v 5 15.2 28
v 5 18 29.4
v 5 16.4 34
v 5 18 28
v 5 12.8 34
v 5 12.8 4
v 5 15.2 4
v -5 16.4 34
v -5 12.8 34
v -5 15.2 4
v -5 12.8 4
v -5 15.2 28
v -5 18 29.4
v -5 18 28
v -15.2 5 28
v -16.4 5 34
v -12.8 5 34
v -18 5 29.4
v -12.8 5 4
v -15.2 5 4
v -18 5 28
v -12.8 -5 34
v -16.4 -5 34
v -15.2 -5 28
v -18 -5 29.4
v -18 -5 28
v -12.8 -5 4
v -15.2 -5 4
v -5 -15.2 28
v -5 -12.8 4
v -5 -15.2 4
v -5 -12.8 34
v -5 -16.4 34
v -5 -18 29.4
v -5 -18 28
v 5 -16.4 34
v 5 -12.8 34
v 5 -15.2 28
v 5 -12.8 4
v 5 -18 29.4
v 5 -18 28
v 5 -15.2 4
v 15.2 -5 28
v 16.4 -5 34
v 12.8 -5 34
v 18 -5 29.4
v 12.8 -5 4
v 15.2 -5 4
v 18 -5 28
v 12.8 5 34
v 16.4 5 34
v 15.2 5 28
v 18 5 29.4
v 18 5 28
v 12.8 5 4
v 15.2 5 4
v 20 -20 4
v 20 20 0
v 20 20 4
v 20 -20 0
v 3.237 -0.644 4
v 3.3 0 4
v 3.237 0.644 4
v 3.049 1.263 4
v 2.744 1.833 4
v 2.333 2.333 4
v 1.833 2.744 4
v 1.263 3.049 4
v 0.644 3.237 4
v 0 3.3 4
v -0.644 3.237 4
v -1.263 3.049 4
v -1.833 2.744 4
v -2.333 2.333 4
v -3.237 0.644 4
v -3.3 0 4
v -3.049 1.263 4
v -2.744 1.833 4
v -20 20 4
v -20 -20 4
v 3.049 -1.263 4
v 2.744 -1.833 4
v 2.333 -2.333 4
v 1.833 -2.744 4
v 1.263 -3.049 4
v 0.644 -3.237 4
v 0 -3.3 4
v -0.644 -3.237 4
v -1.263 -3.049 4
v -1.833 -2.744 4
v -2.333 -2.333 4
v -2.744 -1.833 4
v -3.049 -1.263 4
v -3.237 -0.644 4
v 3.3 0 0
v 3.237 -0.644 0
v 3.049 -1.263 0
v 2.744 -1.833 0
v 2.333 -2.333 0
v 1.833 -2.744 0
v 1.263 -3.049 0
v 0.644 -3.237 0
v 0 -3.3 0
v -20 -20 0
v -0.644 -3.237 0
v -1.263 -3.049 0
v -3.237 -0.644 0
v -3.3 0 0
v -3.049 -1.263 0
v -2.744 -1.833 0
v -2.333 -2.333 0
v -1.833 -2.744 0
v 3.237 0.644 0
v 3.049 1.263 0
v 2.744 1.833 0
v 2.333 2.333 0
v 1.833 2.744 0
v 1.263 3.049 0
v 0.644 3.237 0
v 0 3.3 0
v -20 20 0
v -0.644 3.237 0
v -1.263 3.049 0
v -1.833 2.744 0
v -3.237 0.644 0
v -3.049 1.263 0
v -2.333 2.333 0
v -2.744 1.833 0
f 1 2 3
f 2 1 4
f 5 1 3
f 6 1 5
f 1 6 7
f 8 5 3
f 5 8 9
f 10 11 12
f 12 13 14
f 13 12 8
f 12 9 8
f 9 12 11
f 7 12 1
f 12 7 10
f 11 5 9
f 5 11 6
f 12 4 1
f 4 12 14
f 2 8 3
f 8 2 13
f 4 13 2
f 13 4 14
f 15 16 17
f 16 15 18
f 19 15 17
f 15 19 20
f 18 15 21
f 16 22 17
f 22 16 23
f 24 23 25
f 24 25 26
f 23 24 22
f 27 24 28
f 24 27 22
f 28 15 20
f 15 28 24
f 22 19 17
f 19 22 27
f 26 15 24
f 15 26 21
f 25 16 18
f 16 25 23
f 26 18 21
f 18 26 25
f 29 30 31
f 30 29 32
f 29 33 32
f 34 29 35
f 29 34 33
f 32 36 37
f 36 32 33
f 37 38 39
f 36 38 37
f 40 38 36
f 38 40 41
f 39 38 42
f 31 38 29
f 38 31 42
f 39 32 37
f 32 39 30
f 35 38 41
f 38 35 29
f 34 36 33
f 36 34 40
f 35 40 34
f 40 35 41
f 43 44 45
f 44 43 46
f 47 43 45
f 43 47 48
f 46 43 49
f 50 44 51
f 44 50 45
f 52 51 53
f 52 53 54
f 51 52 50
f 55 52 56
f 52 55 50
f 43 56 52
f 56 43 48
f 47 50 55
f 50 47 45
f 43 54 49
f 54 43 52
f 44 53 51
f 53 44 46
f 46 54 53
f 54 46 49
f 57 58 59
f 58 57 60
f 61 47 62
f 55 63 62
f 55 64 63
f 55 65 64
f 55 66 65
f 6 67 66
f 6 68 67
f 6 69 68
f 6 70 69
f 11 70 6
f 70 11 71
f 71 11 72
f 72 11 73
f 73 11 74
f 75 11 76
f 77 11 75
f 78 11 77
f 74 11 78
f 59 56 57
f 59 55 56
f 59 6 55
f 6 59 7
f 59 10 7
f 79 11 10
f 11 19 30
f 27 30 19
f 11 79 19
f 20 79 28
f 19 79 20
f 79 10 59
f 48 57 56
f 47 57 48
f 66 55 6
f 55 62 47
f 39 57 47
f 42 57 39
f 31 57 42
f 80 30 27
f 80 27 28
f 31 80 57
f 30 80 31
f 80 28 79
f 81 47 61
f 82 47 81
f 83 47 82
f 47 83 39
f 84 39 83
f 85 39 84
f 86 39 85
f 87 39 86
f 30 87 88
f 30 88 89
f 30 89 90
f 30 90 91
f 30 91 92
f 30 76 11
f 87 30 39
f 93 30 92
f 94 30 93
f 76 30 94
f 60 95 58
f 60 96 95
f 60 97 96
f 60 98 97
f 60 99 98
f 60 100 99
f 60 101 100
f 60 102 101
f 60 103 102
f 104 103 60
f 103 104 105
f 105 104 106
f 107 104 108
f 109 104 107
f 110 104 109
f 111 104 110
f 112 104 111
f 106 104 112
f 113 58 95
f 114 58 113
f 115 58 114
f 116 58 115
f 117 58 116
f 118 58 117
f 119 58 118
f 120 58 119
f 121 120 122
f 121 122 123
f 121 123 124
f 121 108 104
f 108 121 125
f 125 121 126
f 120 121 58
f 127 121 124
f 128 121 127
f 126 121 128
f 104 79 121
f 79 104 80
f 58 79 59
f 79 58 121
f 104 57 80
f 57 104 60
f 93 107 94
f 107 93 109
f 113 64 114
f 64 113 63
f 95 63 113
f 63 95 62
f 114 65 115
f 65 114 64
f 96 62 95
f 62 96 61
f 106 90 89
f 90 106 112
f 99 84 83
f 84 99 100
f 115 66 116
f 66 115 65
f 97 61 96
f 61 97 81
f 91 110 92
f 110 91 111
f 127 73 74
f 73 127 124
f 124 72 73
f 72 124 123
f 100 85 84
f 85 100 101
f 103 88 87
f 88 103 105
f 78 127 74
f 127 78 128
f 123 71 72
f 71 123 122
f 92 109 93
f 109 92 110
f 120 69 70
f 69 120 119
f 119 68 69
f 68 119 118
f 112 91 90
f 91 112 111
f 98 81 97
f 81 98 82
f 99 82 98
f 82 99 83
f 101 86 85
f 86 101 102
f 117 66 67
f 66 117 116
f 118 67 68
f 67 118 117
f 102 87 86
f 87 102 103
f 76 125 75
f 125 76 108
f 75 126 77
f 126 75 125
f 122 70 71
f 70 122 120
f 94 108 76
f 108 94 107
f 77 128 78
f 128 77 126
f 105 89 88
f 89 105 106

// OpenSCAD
$fn = 32;

// ----------------------------------------------------------------------
// Snap-fit latch: 4 arms, 30 mm tall, 3 mm undercut hooks
// ----------------------------------------------------------------------

// --- parameters (mm) ---
base_d = 40;              // base plate depth
base_h = 4;               // base plate thickness
span = 28;                // distance between opposite arms
arm_t = 2.4;              // arm thickness
arm_d = 10;               // arm width
height = 30;              // free arm length
head_len = 3;             // hook reach
head_h = 6;               // hook height
lead = 1.4;               // lead-in ramp thickness
bore_d = 6.6;             // base fixing bore
top_z = 34;               // height of the arm tips above the base

arms = 4;

difference() {
  union() {
    /* base plate, centred on the arm ring */
    translate([-20, -20, 0]) cube([base_d, base_d, base_h]);
    for (a = [0 : 360 / arms : 359]) rotate([0, 0, a]) {
    /* arm, sunk 0.5 mm into the base */
    translate([-arm_d / 2, span / 2 - arm_t / 2, base_h - 0.5]) cube([arm_d, arm_t, height + 0.5]);
    /* hook: a convex hull of a tall inner block and a thin outer lip
       gives a flat undercut below and a lead-in ramp on top */
    hull() {
      translate([-arm_d / 2, span / 2 + arm_t / 2 - 0.6, top_z - head_h]) cube([arm_d, lead + 0.4, head_h]);
      translate([-arm_d / 2, span / 2 + arm_t / 2 - 0.2, top_z - head_h]) cube([arm_d, head_len, lead]);
    }
    }
  }
  translate([0, 0, -2.5]) cylinder(h = base_h + 5, d = bore_d);
}
